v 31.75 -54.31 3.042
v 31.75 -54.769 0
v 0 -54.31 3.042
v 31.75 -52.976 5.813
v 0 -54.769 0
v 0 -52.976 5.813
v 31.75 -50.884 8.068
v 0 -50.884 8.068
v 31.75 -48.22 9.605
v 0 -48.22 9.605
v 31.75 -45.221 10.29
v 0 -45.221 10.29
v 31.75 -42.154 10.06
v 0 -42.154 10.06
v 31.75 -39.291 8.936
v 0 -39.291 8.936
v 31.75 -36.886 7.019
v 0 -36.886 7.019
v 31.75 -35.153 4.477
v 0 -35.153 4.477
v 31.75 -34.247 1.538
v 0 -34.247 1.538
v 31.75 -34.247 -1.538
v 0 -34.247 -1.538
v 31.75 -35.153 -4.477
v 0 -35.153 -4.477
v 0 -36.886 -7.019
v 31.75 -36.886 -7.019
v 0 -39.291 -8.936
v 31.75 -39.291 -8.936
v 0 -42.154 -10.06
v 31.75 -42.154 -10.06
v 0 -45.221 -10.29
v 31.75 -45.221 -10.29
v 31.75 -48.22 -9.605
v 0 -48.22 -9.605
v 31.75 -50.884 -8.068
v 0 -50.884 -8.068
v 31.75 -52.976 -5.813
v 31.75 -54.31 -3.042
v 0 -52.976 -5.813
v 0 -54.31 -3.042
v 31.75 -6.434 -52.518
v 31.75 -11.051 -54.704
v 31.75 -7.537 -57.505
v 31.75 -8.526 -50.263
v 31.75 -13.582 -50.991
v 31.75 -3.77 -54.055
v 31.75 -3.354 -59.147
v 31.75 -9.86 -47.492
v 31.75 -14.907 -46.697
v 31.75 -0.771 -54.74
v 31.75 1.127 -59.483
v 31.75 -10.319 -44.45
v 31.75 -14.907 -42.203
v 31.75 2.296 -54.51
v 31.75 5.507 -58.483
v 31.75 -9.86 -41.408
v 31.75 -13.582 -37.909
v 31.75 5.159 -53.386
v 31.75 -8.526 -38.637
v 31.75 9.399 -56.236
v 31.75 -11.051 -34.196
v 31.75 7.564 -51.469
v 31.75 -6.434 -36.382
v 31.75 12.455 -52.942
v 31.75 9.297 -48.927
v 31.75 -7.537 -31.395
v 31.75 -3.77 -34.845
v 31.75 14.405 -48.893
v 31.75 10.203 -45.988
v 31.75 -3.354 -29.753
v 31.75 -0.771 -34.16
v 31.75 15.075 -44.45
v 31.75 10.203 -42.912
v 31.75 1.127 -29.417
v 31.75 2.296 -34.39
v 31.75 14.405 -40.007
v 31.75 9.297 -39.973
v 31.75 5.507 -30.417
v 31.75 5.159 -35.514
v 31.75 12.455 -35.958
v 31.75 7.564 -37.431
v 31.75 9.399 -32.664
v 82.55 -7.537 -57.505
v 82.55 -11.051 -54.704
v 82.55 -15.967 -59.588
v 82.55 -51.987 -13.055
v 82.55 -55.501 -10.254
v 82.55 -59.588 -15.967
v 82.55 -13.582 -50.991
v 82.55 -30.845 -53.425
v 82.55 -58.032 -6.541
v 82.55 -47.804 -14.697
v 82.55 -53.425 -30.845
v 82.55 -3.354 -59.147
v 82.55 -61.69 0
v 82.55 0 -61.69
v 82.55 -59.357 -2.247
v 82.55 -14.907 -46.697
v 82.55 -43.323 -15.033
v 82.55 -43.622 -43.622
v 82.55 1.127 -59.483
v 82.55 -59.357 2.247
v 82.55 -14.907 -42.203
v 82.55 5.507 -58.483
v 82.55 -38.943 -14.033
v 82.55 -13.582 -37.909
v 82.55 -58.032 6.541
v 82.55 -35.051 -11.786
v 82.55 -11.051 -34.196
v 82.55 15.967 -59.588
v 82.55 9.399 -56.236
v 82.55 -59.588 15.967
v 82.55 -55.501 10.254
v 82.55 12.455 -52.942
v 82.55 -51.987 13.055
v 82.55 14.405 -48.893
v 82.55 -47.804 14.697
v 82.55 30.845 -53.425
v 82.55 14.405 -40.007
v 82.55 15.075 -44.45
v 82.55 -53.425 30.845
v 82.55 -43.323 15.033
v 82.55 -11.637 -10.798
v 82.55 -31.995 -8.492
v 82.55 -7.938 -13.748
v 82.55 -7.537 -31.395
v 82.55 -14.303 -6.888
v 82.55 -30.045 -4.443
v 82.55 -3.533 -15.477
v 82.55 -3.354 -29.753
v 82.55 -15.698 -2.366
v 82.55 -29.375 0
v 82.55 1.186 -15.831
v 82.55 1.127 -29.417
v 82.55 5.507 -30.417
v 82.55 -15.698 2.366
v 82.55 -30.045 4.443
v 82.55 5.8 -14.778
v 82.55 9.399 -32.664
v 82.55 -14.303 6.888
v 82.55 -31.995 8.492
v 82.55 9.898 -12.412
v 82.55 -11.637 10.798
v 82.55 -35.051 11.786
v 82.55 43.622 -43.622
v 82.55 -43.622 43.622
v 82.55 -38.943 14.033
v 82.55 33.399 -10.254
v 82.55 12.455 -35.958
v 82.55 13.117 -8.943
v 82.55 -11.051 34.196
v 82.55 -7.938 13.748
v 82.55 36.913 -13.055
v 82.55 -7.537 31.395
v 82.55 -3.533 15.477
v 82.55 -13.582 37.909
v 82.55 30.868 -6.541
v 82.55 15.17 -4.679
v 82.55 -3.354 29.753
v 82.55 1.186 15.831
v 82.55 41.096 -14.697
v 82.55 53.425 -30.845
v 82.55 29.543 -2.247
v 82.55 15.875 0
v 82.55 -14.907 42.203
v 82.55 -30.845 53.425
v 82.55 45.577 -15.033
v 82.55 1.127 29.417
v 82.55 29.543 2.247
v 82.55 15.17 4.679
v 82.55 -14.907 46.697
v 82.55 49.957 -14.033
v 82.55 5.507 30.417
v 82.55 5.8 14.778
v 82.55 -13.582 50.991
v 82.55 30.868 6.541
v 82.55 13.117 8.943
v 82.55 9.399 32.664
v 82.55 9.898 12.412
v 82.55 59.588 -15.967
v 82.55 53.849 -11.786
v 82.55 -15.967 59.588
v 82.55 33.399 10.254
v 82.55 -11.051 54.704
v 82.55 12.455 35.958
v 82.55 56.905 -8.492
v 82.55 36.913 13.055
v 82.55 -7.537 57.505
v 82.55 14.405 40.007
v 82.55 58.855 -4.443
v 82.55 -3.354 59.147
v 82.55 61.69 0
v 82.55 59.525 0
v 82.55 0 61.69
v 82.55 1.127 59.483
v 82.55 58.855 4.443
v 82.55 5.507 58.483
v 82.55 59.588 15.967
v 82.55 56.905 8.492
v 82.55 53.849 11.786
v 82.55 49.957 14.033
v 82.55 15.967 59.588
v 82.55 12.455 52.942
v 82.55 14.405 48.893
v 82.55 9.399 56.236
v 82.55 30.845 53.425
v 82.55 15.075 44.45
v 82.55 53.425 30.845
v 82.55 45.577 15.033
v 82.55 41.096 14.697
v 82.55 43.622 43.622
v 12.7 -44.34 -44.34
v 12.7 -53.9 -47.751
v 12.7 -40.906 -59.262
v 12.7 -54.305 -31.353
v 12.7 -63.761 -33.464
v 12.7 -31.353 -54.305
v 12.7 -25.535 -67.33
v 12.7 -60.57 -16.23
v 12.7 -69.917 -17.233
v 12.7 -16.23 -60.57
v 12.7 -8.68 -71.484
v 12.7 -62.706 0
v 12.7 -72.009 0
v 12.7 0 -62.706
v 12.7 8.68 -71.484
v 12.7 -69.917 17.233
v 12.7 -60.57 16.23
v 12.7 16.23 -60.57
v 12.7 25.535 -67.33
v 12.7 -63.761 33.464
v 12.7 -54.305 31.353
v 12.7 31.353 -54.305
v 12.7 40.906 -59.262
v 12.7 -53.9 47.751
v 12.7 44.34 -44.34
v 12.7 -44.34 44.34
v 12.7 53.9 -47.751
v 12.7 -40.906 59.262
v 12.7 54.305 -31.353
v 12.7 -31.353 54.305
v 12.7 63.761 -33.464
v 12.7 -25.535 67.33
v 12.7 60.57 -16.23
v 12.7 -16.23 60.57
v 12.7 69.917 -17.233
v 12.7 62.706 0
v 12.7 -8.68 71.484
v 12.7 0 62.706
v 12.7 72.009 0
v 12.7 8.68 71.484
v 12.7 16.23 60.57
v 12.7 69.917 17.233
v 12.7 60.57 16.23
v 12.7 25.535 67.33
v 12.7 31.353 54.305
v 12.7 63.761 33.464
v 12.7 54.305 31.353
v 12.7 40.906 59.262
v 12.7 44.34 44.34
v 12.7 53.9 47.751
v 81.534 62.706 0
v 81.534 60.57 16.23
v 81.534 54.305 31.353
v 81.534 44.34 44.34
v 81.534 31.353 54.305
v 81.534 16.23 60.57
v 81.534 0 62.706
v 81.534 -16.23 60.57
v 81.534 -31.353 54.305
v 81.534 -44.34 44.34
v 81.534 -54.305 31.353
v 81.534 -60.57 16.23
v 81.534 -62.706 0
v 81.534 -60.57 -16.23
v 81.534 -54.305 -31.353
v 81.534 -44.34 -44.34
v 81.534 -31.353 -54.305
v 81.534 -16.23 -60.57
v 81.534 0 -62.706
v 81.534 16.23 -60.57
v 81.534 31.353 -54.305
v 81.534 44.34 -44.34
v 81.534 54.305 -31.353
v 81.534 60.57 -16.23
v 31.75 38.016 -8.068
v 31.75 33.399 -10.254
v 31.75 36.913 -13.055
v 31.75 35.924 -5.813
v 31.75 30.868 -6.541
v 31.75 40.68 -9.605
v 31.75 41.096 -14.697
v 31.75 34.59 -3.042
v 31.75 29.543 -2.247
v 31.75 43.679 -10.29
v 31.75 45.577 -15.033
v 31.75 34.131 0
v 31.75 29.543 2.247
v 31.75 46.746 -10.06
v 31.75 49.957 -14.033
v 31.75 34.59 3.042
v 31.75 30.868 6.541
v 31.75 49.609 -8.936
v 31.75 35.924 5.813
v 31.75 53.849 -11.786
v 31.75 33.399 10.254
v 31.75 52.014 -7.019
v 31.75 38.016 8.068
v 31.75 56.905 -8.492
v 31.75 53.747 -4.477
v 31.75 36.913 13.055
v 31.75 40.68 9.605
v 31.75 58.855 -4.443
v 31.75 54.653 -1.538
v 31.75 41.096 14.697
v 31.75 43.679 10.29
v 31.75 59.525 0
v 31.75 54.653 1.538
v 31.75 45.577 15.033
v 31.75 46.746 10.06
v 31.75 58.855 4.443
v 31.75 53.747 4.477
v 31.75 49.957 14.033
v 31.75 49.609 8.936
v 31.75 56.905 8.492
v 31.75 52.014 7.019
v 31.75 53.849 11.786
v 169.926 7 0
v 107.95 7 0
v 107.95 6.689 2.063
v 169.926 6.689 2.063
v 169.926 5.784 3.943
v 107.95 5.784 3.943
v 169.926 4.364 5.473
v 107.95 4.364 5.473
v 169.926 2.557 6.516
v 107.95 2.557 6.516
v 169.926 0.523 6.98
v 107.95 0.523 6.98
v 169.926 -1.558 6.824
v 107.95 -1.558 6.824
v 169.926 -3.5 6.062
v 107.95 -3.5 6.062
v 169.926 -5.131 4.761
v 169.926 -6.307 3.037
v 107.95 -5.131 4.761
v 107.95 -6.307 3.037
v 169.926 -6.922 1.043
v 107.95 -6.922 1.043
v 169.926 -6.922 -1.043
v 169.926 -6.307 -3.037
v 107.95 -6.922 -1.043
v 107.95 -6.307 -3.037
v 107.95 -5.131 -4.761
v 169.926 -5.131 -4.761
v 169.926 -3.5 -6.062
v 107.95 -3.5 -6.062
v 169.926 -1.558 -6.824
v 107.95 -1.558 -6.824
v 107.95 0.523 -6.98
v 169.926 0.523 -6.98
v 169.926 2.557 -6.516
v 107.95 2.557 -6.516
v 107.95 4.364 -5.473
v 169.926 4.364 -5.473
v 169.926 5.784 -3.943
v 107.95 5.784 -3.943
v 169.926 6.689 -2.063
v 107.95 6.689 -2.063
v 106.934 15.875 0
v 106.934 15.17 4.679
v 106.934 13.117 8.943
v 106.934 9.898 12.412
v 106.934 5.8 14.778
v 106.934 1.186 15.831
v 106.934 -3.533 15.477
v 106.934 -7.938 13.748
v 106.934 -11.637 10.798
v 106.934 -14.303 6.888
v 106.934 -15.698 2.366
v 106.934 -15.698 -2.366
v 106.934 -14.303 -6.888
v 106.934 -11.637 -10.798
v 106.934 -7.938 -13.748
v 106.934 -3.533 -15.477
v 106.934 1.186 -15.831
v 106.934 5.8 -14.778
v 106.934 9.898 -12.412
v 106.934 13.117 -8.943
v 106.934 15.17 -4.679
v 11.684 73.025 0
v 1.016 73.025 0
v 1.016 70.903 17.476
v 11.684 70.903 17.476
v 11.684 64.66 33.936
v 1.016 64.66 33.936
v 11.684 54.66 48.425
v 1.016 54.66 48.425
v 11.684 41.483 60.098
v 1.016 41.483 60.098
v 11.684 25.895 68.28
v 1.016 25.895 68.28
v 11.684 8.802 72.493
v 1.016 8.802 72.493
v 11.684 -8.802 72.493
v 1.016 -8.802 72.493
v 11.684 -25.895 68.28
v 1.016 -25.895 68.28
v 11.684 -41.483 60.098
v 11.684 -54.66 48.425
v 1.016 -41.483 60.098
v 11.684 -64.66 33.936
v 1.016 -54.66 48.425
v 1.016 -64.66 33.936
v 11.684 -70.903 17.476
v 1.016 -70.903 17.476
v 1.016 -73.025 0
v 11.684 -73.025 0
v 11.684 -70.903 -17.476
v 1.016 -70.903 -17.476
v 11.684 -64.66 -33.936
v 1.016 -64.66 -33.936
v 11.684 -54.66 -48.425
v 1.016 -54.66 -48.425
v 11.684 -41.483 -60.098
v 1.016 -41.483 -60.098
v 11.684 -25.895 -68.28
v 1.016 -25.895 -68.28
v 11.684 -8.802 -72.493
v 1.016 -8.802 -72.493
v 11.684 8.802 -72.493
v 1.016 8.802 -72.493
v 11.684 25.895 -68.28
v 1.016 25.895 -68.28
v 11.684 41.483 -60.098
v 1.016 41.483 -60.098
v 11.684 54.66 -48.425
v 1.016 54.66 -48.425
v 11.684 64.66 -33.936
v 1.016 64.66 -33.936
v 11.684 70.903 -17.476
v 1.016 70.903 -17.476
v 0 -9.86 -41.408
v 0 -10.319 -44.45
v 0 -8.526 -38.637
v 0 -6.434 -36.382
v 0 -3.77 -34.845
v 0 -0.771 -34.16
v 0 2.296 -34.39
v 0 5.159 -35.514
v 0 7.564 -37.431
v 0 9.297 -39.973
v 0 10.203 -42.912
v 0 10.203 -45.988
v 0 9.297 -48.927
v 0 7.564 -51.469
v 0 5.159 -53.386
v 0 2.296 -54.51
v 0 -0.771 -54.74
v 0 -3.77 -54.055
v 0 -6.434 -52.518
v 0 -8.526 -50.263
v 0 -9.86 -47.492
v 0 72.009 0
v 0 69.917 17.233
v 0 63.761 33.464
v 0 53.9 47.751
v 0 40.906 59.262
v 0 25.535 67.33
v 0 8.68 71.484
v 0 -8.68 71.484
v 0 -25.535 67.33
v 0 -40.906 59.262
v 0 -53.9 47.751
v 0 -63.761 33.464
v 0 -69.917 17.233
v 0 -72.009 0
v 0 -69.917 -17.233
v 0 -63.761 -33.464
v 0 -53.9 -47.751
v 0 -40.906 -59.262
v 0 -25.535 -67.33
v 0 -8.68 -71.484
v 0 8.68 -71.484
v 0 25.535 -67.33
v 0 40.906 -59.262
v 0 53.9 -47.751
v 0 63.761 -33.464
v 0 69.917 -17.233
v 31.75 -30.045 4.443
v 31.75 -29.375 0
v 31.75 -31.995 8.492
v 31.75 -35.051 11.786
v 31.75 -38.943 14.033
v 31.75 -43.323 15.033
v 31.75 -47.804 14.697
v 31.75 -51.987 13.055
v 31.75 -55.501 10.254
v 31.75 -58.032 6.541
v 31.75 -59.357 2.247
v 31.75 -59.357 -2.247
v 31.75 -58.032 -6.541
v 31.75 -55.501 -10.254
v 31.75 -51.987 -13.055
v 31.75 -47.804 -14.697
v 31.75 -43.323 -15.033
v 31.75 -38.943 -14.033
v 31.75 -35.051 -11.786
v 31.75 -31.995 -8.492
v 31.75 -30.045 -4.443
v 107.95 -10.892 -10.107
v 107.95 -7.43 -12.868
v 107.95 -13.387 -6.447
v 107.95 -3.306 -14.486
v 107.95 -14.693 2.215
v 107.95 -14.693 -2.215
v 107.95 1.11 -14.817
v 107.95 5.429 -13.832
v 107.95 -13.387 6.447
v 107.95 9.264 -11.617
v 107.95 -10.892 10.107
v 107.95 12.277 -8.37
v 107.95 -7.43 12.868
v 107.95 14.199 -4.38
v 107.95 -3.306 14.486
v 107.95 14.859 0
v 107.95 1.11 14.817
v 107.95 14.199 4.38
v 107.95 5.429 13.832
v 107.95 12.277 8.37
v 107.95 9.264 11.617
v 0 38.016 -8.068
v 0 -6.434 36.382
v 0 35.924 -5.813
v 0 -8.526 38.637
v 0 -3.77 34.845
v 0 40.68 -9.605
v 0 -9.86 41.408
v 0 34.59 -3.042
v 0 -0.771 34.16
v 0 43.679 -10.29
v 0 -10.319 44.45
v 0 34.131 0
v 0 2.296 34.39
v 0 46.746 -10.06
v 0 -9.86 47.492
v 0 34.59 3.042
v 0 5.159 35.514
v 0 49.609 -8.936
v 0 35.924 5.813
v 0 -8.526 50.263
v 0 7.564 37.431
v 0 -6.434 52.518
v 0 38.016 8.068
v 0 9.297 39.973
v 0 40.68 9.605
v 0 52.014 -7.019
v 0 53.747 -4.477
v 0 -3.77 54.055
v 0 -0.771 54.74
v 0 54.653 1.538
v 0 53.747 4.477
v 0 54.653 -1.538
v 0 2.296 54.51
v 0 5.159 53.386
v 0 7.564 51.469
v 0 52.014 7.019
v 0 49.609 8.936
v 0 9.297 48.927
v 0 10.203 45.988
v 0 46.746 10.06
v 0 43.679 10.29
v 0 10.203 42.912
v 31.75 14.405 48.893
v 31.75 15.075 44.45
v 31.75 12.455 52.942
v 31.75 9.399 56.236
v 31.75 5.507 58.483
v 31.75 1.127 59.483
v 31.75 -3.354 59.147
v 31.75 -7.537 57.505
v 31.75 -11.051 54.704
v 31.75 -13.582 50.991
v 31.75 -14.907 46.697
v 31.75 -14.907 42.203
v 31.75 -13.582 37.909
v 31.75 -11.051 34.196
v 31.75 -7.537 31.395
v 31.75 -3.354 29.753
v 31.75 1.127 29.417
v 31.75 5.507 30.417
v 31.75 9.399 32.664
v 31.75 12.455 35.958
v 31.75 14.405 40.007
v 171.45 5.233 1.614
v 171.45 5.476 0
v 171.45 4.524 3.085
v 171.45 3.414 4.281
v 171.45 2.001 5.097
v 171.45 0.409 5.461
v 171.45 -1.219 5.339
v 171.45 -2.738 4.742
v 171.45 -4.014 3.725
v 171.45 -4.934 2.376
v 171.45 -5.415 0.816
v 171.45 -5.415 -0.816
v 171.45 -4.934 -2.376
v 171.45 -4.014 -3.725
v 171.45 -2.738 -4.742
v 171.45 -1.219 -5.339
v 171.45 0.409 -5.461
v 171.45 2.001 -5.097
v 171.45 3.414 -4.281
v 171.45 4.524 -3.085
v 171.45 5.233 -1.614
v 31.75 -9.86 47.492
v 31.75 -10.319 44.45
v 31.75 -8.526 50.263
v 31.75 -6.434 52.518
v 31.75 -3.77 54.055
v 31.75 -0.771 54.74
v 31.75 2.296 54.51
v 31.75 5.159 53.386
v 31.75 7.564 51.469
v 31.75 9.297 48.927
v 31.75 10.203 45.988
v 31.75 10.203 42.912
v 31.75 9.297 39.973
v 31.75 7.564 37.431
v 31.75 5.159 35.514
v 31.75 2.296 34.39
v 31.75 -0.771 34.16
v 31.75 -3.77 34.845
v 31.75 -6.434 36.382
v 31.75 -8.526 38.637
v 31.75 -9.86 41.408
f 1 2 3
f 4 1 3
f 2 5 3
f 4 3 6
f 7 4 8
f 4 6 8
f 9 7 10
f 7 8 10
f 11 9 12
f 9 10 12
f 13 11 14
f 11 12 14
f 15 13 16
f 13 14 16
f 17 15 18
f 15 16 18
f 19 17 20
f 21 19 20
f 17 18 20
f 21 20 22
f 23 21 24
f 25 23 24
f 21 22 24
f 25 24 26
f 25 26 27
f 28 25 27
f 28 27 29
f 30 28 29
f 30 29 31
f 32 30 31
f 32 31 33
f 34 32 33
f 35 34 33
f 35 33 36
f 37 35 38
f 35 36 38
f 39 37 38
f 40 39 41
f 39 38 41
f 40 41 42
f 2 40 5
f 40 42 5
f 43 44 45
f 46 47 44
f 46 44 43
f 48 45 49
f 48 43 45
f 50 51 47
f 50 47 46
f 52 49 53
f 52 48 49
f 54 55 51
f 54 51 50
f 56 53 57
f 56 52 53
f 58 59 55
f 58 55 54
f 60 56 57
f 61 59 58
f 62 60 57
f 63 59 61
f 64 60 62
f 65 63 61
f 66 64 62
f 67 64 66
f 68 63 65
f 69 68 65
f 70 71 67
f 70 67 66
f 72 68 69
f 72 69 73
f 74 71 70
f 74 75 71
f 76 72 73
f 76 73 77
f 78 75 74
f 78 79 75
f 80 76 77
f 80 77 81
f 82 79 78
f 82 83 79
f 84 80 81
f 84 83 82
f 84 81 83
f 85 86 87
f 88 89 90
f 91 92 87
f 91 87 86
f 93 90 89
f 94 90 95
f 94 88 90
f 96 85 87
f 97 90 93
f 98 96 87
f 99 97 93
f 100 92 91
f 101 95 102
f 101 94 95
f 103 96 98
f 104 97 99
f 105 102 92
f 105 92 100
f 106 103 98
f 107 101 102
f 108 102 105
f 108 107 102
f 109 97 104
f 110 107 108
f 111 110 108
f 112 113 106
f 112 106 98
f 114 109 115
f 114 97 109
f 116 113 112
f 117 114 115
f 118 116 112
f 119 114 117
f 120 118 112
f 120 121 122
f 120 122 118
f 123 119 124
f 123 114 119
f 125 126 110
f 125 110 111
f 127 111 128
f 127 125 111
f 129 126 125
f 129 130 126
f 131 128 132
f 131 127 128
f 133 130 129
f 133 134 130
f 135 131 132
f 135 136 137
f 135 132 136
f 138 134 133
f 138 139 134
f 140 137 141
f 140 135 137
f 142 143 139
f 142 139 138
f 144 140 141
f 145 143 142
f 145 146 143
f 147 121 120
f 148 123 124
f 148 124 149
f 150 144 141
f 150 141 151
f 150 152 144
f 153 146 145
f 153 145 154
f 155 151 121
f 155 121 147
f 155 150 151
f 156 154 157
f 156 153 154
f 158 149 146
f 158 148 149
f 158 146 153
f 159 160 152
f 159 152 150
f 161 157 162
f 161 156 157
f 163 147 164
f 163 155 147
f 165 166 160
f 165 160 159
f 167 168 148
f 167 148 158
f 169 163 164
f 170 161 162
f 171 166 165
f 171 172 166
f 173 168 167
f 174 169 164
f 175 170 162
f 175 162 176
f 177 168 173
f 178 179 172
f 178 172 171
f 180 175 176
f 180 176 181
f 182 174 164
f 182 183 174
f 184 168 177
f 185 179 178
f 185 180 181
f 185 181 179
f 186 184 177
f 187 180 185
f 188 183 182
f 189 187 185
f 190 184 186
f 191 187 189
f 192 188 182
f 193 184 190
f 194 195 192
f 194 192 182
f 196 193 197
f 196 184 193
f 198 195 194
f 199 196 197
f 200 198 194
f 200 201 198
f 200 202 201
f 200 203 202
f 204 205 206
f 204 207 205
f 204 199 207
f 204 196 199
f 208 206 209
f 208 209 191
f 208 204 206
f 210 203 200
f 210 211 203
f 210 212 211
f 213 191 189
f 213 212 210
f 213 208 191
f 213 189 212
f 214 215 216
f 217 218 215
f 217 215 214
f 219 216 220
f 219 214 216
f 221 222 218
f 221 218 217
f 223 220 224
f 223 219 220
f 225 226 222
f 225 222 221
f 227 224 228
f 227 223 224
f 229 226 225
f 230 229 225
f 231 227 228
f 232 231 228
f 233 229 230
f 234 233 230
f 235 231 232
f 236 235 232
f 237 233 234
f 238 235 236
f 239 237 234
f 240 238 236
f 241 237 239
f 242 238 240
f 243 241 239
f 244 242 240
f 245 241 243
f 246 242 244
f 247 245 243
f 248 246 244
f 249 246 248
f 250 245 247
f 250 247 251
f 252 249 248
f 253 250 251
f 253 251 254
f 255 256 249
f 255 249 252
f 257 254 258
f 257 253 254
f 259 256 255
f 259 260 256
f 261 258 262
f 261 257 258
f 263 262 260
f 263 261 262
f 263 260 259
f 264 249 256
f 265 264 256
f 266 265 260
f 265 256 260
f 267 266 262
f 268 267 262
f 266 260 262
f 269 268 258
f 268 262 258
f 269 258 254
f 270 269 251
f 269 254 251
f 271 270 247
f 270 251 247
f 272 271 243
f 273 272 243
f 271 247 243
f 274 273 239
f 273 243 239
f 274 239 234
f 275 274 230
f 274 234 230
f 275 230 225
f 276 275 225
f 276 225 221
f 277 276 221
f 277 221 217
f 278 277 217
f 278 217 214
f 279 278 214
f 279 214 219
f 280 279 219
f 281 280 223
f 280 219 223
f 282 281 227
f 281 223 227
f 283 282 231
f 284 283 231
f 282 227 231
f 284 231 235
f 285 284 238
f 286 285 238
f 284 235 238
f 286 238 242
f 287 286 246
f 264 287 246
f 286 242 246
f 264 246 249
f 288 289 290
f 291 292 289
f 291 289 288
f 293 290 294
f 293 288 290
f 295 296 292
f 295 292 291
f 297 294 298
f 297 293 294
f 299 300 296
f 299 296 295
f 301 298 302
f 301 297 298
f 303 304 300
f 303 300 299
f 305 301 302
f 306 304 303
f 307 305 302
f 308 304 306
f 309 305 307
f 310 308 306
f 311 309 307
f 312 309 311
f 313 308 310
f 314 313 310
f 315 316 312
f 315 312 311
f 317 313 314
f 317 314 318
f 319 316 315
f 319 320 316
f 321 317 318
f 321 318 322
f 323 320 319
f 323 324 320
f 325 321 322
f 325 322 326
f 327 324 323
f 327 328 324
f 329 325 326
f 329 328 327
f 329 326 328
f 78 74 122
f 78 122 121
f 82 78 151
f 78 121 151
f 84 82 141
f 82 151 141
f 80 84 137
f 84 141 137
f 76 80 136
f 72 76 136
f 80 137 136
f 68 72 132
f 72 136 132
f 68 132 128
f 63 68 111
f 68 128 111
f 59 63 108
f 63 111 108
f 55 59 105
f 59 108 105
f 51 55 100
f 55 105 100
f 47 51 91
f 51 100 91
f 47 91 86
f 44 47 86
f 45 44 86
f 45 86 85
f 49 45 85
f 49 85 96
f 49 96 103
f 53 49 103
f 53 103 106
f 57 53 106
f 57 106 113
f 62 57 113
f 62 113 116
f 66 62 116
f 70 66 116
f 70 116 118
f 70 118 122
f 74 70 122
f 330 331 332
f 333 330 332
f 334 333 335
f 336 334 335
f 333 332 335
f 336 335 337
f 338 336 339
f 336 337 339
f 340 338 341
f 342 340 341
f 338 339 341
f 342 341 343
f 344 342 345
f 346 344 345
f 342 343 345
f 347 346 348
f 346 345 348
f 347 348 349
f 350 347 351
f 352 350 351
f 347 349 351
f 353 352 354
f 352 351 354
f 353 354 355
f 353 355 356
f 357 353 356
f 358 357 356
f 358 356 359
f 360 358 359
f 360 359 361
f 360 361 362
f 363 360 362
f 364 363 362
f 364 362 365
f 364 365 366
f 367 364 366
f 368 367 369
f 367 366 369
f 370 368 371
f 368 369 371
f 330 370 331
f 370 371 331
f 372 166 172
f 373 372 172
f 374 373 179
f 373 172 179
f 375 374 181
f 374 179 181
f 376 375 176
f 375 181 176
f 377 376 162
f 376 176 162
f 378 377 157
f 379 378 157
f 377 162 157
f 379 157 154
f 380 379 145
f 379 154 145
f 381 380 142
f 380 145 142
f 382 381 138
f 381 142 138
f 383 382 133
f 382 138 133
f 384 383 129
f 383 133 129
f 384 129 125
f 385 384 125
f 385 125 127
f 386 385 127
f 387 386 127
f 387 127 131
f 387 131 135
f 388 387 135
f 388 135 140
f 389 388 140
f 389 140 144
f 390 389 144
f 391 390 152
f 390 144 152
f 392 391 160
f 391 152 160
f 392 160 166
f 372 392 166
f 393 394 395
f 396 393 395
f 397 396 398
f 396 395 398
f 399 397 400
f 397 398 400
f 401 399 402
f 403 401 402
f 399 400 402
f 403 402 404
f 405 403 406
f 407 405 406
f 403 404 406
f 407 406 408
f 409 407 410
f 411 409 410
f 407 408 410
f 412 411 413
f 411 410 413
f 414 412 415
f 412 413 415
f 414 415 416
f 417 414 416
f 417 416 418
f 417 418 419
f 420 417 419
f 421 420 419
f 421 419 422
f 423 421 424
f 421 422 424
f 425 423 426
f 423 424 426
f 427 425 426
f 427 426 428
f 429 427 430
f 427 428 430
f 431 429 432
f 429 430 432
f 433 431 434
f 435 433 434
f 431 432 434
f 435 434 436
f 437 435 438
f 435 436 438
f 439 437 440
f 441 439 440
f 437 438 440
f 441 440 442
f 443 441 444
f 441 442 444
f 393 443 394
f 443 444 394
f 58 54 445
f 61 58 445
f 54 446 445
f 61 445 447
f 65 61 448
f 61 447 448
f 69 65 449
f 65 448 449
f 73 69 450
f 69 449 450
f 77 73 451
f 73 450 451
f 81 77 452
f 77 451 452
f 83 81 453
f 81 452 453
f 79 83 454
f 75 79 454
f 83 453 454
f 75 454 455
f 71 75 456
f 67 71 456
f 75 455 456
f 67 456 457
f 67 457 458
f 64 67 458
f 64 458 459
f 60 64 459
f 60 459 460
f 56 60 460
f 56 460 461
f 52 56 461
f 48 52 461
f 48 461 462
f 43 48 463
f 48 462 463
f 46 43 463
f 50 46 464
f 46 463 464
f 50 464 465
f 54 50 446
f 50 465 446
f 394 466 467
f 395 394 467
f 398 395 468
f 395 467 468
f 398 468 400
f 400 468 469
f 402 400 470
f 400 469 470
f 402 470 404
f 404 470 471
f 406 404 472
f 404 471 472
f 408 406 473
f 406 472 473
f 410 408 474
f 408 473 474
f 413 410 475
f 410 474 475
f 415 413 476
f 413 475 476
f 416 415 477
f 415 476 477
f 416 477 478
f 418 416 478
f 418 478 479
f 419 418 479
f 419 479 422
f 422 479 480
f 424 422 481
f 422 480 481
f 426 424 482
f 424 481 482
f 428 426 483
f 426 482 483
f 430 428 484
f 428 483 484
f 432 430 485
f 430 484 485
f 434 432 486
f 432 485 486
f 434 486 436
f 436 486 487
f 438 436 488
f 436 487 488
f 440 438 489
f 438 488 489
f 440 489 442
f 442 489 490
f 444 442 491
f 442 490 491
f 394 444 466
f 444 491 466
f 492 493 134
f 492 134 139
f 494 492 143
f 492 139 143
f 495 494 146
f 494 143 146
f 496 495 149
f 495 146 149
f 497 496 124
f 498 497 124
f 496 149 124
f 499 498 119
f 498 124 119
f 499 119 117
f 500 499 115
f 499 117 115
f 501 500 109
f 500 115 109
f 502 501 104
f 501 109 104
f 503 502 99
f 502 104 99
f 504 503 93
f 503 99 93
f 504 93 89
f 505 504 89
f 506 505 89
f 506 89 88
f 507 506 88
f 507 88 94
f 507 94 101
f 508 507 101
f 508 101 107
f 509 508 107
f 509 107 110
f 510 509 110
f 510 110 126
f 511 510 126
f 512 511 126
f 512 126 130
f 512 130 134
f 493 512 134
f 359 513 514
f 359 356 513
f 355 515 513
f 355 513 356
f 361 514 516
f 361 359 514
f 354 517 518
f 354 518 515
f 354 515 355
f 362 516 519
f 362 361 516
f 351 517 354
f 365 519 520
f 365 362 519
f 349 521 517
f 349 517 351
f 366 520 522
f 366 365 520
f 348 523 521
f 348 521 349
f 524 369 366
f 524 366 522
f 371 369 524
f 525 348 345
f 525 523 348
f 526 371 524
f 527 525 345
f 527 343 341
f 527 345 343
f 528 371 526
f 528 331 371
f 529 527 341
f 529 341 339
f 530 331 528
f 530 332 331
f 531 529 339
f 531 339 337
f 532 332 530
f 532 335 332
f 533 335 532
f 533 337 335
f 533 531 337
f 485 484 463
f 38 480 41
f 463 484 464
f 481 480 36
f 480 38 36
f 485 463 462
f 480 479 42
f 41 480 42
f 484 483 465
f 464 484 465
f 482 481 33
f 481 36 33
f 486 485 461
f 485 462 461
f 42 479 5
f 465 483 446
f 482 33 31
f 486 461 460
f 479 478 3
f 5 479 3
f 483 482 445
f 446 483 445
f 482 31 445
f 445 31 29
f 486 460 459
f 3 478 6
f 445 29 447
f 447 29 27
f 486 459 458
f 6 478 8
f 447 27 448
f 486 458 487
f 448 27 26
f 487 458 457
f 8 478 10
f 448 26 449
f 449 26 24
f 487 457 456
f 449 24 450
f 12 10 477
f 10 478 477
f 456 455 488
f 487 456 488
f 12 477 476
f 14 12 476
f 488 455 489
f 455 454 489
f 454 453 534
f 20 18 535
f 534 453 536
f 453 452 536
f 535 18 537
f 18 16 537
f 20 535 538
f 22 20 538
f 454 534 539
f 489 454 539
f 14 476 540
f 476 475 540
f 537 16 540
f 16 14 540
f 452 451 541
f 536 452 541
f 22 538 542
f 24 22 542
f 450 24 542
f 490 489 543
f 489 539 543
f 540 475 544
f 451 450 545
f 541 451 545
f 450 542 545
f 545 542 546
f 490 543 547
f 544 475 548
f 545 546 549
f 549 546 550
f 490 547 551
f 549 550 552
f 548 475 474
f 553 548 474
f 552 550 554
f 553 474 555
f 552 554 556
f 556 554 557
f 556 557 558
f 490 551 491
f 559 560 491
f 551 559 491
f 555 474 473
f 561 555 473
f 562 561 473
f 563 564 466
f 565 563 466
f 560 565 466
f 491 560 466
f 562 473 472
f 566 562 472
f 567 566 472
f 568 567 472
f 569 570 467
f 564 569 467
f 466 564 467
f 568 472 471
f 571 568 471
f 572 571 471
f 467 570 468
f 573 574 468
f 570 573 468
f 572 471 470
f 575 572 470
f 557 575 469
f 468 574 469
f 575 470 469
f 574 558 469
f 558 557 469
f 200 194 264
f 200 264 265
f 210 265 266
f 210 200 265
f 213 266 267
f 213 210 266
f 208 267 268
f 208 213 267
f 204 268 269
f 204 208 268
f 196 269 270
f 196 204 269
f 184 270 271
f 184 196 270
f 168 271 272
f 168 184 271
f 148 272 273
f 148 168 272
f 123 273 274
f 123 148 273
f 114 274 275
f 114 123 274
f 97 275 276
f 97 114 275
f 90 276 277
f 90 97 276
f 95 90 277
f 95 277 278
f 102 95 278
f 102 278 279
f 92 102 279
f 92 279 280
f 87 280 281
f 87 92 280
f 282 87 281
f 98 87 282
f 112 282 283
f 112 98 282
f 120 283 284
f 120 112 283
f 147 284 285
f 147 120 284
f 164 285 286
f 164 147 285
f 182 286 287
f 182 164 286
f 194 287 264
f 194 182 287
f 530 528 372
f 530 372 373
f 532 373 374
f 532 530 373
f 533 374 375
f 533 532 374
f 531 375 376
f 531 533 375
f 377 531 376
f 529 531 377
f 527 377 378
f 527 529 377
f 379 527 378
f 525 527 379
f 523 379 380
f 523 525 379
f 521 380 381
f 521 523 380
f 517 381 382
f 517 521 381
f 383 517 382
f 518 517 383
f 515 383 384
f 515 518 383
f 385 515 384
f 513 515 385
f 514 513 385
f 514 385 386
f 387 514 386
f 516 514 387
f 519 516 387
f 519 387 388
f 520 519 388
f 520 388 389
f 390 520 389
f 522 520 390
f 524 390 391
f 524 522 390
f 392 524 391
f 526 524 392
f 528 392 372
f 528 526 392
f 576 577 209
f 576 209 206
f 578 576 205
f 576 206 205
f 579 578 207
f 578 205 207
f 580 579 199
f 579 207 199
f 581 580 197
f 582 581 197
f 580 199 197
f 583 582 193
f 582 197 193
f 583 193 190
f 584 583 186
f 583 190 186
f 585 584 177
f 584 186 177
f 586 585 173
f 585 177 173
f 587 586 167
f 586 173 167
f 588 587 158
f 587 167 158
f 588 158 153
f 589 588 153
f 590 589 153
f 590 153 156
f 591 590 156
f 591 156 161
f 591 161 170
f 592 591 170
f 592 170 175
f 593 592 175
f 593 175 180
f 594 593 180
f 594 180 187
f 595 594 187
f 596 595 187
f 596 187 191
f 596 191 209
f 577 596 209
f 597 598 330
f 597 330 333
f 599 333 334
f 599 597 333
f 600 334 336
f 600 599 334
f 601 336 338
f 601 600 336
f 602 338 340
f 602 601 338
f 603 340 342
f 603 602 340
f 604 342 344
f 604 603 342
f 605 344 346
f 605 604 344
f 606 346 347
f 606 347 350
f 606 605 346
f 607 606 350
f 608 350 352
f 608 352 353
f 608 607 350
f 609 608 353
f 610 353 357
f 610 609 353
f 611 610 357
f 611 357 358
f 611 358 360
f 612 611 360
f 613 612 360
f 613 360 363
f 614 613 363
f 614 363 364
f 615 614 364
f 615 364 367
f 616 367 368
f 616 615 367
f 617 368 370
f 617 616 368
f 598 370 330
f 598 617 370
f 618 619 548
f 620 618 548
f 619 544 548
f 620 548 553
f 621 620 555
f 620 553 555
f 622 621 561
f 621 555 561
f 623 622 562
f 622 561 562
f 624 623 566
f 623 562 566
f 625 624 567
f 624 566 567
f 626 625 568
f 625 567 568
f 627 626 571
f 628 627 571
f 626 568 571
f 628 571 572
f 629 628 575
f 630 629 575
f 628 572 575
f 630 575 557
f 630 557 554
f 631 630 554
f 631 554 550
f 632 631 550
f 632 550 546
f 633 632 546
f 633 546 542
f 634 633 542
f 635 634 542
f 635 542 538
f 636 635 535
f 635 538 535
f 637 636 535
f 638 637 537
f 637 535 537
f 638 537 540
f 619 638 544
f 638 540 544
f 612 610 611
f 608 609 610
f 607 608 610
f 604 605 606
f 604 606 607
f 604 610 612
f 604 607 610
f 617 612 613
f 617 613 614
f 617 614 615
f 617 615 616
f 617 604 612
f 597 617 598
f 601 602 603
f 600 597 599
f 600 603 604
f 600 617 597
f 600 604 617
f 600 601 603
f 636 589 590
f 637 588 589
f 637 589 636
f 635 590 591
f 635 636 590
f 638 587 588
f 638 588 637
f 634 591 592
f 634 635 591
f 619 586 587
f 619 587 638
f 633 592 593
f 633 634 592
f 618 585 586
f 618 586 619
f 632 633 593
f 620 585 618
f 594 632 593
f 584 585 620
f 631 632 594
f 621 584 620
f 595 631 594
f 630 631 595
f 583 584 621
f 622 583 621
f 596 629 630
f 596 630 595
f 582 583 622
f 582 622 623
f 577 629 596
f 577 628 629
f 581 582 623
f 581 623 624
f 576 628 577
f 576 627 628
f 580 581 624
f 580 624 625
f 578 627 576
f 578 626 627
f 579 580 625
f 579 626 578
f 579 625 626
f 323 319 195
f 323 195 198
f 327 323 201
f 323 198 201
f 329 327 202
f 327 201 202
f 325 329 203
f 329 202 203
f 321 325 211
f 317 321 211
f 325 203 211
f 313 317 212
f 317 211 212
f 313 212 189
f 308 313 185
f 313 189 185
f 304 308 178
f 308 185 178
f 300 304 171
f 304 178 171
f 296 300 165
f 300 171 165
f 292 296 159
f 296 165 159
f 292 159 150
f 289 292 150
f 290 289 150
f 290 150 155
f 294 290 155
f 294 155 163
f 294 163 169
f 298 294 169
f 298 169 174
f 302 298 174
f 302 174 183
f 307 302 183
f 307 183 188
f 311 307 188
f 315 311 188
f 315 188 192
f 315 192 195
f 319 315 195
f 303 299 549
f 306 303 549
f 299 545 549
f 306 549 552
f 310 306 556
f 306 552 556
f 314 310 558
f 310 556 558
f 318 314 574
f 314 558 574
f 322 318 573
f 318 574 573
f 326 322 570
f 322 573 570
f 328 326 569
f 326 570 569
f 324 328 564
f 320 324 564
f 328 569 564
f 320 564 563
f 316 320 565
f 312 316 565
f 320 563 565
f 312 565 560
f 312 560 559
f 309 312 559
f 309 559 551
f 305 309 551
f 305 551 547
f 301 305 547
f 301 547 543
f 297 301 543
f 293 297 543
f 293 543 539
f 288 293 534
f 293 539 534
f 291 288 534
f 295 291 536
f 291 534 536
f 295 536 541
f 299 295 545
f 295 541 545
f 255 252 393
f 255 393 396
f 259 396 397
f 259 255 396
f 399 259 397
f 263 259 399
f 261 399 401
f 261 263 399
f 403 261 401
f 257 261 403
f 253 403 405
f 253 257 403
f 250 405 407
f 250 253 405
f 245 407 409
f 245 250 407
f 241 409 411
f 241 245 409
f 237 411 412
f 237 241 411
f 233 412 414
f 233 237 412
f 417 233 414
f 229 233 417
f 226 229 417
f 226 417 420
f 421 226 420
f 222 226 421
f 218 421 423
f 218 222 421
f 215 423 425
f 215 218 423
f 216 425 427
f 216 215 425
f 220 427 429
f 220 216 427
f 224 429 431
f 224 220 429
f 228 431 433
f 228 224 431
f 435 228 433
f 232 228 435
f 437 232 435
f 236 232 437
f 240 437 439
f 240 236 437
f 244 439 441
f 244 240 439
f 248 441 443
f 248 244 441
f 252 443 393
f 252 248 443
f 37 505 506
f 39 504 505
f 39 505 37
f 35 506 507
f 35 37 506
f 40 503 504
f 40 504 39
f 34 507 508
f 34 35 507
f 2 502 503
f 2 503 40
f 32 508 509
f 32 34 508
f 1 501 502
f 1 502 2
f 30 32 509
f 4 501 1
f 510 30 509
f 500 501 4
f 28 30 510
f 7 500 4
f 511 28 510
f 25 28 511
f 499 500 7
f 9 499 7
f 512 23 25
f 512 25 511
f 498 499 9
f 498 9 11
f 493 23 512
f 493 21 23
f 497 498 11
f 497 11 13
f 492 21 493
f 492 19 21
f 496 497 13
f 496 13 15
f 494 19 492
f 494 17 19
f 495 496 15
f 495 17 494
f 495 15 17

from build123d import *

# Parameters (mm, degrees)
F0_R            = 73.025
F1_DEPTH        = 12.7
F2_R            = 62.70625
F3_DEPTH        = 69.85
F4_R            = 15.875
F5_DEPTH        = 25.4
F6_R            = 7
F7_DEPTH        = 63.5
F8_SIZE         = 1.016
F9_SIZE         = 1.524
F11_D           = 20.6375
F11_CBORE_D     = 30.1498
F11_CBORE_DEPTH = 50.8


# Not quite as in the source:
# - a length typed as a fraction of an inch, garbled in the dataset ("3 / 203.2 mm" for 3/8 in), is restored


with BuildPart() as f1:
    # F0 (on Right) → F1 (new body)
    with BuildSketch(Plane.YZ):
        Circle(F0_R)
    extrude(amount=F1_DEPTH)

    # F2 (on face) → F3 (join)
    with BuildSketch(Plane.YZ.offset(12.7)):
        Circle(F2_R)
    extrude(amount=F3_DEPTH)

    # F4 (on face) → F5 (join)
    with BuildSketch(Plane.YZ.offset(82.55)):
        Circle(F4_R)
    extrude(amount=F5_DEPTH)

    # F6 (on face) → F7 (join)
    with BuildSketch(Plane.YZ.offset(107.95)):
        Circle(F6_R)
    extrude(amount=F7_DEPTH)

    # F8
    f8_edges = [f1.edges().sort_by_distance(p)[0] for p in [
        (6.35, 73.025, 0),
        (0, -73.025, 0),
        (12.7, -73.025, 0),
        (82.55, -62.70625, 0),
        (107.95, -15.875, 0),
    ]]
    chamfer(f8_edges, length=F8_SIZE)

    # F9
    f9_edges = [f1.edges().sort_by_distance(p)[0] for p in [
        (171.45, -7, 0),
    ]]
    chamfer(f9_edges, length=F9_SIZE)

    # F11 (through all)
    with Locations(Plane.YZ.offset(82.55)):
        with Locations((0, 44.45), (44.45, 0), (0, -44.45), (-44.45, 0)):
            CounterBoreHole(F11_D / 2, F11_CBORE_D / 2, F11_CBORE_DEPTH)


solid = f1.part
